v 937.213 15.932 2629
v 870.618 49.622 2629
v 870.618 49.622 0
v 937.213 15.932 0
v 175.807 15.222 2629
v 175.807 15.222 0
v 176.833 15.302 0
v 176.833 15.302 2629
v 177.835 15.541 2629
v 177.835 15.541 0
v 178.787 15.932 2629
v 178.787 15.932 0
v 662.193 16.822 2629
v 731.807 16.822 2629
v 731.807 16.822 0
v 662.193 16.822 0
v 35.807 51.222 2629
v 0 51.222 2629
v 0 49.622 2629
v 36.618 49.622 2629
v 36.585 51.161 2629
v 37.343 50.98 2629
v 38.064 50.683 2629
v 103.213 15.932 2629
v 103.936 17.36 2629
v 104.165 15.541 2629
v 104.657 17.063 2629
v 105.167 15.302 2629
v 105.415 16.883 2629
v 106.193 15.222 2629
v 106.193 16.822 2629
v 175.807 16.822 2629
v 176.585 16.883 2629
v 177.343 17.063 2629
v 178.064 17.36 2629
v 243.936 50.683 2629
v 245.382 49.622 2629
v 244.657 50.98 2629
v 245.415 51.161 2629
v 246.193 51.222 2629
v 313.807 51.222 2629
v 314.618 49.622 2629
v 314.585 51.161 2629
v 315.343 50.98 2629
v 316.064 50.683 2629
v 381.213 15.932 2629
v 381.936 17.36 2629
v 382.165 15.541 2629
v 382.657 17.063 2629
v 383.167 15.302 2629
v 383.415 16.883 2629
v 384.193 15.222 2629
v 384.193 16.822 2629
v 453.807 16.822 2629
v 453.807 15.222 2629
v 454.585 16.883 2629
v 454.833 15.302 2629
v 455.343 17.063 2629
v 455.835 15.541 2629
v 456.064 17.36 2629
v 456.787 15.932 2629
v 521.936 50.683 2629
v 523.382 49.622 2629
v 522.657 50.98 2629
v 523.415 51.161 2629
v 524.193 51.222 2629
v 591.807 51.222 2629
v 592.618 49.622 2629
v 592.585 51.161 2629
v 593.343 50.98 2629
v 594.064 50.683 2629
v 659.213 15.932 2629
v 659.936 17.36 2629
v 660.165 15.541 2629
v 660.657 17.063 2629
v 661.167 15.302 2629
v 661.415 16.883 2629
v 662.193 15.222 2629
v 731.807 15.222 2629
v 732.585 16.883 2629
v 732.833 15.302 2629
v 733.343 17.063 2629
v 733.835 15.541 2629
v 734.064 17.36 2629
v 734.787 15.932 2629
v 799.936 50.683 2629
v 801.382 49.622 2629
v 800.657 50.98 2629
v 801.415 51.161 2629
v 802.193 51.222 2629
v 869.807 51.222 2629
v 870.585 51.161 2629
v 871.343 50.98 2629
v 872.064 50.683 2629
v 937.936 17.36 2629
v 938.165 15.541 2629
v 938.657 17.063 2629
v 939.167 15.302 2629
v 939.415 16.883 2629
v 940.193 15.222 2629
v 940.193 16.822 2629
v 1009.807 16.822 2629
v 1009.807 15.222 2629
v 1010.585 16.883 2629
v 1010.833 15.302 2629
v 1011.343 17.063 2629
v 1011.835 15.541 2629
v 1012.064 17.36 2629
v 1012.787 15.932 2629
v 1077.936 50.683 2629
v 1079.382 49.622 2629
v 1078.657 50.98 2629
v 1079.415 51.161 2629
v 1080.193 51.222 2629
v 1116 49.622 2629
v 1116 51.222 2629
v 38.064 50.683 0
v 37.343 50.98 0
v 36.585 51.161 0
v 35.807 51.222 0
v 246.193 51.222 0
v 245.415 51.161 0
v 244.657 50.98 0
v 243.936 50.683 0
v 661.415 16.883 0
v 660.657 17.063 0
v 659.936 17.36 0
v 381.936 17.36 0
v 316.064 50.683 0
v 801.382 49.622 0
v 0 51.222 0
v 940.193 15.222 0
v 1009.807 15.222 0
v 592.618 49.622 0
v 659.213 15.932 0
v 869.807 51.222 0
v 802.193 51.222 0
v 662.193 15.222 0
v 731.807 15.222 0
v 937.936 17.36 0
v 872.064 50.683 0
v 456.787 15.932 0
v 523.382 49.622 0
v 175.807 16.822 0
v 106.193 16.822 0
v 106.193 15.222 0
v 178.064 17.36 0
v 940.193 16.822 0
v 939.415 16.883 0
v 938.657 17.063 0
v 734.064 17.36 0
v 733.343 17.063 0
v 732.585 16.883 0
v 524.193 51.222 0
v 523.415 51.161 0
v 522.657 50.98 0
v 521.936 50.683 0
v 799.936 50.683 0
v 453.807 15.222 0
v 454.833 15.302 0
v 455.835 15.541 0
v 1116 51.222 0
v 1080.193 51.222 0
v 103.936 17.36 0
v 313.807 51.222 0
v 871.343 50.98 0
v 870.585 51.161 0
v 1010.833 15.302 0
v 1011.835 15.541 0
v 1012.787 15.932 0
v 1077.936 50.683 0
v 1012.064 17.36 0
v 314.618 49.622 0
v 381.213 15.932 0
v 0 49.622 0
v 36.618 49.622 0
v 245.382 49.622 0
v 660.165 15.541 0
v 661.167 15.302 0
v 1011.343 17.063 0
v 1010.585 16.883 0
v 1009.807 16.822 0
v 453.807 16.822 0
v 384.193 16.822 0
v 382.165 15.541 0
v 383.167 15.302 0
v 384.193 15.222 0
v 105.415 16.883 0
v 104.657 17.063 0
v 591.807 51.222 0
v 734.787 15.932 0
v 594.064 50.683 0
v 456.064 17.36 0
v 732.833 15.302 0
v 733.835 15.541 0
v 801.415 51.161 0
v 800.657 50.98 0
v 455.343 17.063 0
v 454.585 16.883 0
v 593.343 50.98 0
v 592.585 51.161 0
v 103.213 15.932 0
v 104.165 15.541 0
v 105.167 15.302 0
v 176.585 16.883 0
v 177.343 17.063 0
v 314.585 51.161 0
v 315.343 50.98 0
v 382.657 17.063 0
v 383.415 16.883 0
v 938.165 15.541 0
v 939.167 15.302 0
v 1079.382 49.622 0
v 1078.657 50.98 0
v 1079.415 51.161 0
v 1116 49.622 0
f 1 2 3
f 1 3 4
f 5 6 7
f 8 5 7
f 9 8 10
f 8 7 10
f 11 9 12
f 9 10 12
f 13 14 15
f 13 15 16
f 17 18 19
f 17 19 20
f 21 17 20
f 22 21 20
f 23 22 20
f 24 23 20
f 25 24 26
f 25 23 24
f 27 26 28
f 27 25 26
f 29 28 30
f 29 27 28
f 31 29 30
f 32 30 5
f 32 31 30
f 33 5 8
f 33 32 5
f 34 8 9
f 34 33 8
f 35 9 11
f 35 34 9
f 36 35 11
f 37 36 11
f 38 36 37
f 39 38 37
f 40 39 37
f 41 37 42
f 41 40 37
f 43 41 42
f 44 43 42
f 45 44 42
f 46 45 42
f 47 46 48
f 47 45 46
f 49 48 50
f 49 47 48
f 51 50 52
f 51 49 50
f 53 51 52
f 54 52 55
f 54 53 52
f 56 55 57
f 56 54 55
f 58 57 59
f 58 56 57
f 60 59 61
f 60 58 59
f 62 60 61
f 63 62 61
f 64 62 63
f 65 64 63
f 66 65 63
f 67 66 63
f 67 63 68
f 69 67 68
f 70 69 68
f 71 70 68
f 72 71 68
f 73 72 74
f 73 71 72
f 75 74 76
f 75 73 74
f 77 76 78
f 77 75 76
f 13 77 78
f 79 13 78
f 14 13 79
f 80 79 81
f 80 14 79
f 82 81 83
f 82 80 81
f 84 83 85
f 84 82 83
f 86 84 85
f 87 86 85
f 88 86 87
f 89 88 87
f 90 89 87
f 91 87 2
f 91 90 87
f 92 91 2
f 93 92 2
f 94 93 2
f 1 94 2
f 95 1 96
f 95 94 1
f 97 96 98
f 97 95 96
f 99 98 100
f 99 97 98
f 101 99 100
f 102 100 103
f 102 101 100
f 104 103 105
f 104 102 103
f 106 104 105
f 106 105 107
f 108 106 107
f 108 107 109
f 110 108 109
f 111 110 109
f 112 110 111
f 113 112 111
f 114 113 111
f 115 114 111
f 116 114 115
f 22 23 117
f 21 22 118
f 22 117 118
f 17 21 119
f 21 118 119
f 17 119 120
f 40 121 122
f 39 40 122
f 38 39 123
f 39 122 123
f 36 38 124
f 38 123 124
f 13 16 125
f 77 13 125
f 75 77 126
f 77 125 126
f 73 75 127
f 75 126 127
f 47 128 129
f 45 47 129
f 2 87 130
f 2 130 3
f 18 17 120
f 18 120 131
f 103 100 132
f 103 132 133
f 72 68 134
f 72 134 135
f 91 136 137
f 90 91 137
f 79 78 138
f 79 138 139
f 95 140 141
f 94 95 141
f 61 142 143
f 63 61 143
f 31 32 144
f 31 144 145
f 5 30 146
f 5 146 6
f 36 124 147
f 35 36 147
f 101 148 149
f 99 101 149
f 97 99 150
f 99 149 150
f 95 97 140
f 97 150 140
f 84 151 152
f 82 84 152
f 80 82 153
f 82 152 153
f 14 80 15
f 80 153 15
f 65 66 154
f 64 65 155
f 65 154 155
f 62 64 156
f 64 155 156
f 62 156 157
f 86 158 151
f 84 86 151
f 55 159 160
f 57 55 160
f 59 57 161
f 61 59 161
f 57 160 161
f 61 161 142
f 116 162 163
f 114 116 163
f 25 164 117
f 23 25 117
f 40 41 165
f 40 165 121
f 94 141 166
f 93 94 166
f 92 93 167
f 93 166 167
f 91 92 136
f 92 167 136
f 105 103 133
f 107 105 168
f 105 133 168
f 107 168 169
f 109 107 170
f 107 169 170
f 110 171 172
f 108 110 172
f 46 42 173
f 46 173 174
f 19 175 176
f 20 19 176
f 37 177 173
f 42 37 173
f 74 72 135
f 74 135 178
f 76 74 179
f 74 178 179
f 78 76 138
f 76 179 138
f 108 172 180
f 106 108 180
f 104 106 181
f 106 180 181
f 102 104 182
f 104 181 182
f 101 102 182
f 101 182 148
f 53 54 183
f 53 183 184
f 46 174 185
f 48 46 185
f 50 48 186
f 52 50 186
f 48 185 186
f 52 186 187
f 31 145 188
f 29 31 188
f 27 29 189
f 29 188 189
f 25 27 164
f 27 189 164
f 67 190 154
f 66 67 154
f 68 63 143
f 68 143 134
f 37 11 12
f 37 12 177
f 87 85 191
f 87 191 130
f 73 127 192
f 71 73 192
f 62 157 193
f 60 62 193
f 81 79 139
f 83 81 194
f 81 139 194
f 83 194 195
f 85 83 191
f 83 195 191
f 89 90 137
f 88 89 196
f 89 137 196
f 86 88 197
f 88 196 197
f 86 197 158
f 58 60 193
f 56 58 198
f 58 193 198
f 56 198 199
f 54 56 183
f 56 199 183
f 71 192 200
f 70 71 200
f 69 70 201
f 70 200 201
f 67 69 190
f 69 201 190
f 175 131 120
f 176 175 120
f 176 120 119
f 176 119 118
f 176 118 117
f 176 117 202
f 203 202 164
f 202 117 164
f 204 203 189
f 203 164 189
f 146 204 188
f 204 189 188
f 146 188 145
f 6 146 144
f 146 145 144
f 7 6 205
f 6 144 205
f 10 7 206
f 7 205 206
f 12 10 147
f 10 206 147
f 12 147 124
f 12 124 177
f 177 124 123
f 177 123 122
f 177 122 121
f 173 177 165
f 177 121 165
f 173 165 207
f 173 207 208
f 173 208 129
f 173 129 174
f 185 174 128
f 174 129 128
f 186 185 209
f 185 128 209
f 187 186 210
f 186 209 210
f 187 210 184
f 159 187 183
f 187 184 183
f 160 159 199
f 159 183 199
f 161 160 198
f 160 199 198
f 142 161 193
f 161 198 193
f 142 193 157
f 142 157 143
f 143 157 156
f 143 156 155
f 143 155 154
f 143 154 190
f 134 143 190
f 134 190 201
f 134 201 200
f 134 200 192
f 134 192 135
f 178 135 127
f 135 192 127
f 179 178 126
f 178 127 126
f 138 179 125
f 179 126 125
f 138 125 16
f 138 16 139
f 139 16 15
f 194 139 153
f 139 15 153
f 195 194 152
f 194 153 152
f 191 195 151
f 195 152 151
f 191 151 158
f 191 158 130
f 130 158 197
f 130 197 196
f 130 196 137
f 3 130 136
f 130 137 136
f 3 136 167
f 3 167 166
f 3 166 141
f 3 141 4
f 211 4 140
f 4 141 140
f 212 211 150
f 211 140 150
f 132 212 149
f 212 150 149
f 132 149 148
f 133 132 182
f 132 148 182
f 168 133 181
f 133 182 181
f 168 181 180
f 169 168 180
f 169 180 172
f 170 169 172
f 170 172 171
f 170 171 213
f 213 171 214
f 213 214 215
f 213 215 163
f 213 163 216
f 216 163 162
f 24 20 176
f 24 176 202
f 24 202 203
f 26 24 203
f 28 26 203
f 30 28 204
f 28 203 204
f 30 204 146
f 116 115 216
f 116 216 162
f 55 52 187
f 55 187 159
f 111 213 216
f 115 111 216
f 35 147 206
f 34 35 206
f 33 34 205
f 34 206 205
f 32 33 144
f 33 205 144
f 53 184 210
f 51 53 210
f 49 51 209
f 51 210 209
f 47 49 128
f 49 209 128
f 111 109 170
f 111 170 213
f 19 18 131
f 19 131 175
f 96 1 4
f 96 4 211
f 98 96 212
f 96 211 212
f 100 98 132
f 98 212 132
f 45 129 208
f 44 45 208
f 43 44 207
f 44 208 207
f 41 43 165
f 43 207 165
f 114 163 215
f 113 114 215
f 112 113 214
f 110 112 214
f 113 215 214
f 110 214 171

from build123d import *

# Parameters (mm, degrees)
F1_DEPTH = 2629


with BuildPart() as f1:
    # F0 (on Top) → F1 (new body)
    with BuildSketch(Plane.XY):
        with BuildLine():
            ThreePointArc((103.213446, 15.932448), (104.661294, 15.401879), (106.192738, 15.221745))
            Line((106.192738, 15.221745), (175.807262, 15.221745))
            ThreePointArc((175.807262, 15.221745), (177.338706, 15.401879), (178.786554, 15.932448))
            Line((178.786554, 15.932448), (245.381676, 49.621745))
            Line((245.381676, 49.621745), (314.618324, 49.621745))
            Line((314.618324, 49.621745), (381.213446, 15.932448))
            ThreePointArc((381.213446, 15.932448), (382.661294, 15.401879), (384.192738, 15.221745))
            Line((384.192738, 15.221745), (453.807262, 15.221745))
            ThreePointArc((453.807262, 15.221745), (455.338706, 15.401879), (456.786554, 15.932448))
            Line((456.786554, 15.932448), (523.381676, 49.621745))
            Line((523.381676, 49.621745), (592.618324, 49.621745))
            Line((592.618324, 49.621745), (659.213446, 15.932448))
            ThreePointArc((659.213446, 15.932448), (660.661294, 15.401879), (662.192738, 15.221745))
            Line((662.192738, 15.221745), (731.807262, 15.221745))
            ThreePointArc((731.807262, 15.221745), (733.338706, 15.401879), (734.786554, 15.932448))
            Line((734.786554, 15.932448), (801.381676, 49.621745))
            Line((801.381676, 49.621745), (870.618324, 49.621745))
            Line((870.618324, 49.621745), (937.213446, 15.932448))
            ThreePointArc((937.213446, 15.932448), (938.661294, 15.401879), (940.192738, 15.221745))
            Line((940.192738, 15.221745), (1009.807262, 15.221745))
            ThreePointArc((1009.807262, 15.221745), (1011.338706, 15.401879), (1012.786554, 15.932448))
            Line((1012.786554, 15.932448), (1079.381676, 49.621745))
            Line((1079.381676, 49.621745), (1116, 49.621745))
            Line((1116, 49.621745), (1116, 51.221745))
            Line((1116, 51.221745), (1080.192738, 51.221745))
            ThreePointArc((1080.192738, 51.221745), (1079.032553, 51.08528), (1077.935699, 50.683334))
            Line((1077.935699, 50.683334), (1012.064301, 17.360156))
            ThreePointArc((1012.064301, 17.360156), (1010.967447, 16.95821), (1009.807262, 16.821745))
            Line((1009.807262, 16.821745), (940.192738, 16.821745))
            ThreePointArc((940.192738, 16.821745), (939.032553, 16.95821), (937.935699, 17.360156))
            Line((937.935699, 17.360156), (872.064301, 50.683334))
            ThreePointArc((872.064301, 50.683334), (870.967447, 51.08528), (869.807262, 51.221745))
            Line((869.807262, 51.221745), (802.192738, 51.221745))
            ThreePointArc((802.192738, 51.221745), (801.032553, 51.08528), (799.935699, 50.683334))
            Line((799.935699, 50.683334), (734.064301, 17.360156))
            ThreePointArc((734.064301, 17.360156), (732.967447, 16.95821), (731.807262, 16.821745))
            Line((731.807262, 16.821745), (662.192738, 16.821745))
            ThreePointArc((662.192738, 16.821745), (661.032553, 16.95821), (659.935699, 17.360156))
            Line((659.935699, 17.360156), (594.064301, 50.683334))
            ThreePointArc((594.064301, 50.683334), (592.967447, 51.08528), (591.807262, 51.221745))
            Line((591.807262, 51.221745), (524.192738, 51.221745))
            ThreePointArc((524.192738, 51.221745), (523.032553, 51.08528), (521.935699, 50.683334))
            Line((521.935699, 50.683334), (456.064301, 17.360156))
            ThreePointArc((456.064301, 17.360156), (454.967447, 16.95821), (453.807262, 16.821745))
            Line((453.807262, 16.821745), (384.192738, 16.821745))
            ThreePointArc((384.192738, 16.821745), (383.032553, 16.95821), (381.935699, 17.360156))
            Line((381.935699, 17.360156), (316.064301, 50.683334))
            ThreePointArc((316.064301, 50.683334), (314.967447, 51.08528), (313.807262, 51.221745))
            Line((313.807262, 51.221745), (246.192738, 51.221745))
            ThreePointArc((246.192738, 51.221745), (245.032553, 51.08528), (243.935699, 50.683334))
            Line((243.935699, 50.683334), (178.064301, 17.360156))
            ThreePointArc((178.064301, 17.360156), (176.967447, 16.95821), (175.807262, 16.821745))
            Line((175.807262, 16.821745), (106.192738, 16.821745))
            ThreePointArc((106.192738, 16.821745), (105.032553, 16.95821), (103.935699, 17.360156))
            Line((103.935699, 17.360156), (38.064301, 50.683334))
            ThreePointArc((38.064301, 50.683334), (36.967447, 51.08528), (35.807262, 51.221745))
            Line((35.807262, 51.221745), (0, 51.221745))
            Line((0, 51.221745), (0, 49.621745))
            Line((0, 49.621745), (36.618324, 49.621745))
            Line((36.618324, 49.621745), (103.213446, 15.932448))
        make_face()
    extrude(amount=F1_DEPTH)


solid = f1.part
